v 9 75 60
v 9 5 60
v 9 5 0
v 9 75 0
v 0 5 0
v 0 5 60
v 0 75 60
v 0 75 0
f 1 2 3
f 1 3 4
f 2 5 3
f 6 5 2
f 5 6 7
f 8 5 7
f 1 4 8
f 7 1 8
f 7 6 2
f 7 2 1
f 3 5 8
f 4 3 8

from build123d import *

# Parameters (mm, degrees)
F0_W     = 80
F0_H     = 60
F1_DEPTH = 9
F2_W     = 5
F2_H     = 9
F3_DEPTH = 5
F5_DEPTH = 5
F6_DEPTH = 5


with BuildPart() as f1:
    # F0 (on Right) → F1 (new body)
    with BuildSketch(Plane.YZ):
        with Locations((40, 30)):
            Rectangle(F0_W, F0_H)
    extrude(amount=F1_DEPTH)

    # F2 (on face) → F3 (join)
    with BuildSketch(Plane.YZ.offset(9)):
        with Locations((77.5, 55.5)):
            Rectangle(F2_W, F2_H)
        with Locations((2.5, 55.5)):
            Rectangle(F2_W, F2_H)
        with Locations((2.5, 4.5)):
            Rectangle(F2_W, F2_H)
        with Locations((77.5, 4.5)):
            Rectangle(F2_W, F2_H)
    extrude(amount=F3_DEPTH)

    # F4 (on face) → F5 (cut, through all)
    with BuildSketch(Plane(origin=(0, 80, 0), x_dir=(-1, 0, 0), z_dir=(0, 1, 0))):
        Polygon((0, 60), (-14, 60), (-14, 51), (-9, 51), (-9, 9), (-14, 9), (-14, 0), (0, 0), align=None)
    extrude(amount=-F5_DEPTH, mode=Mode.SUBTRACT)

    # F6 (cut, through all): a face of the model
    f6_faces = [f1.faces().sort_by_distance(p)[0] for p in [
        (5.5, 0, 30),
    ]]
    extrude(f6_faces, amount=-F6_DEPTH, mode=Mode.SUBTRACT)


solid = f1.part
